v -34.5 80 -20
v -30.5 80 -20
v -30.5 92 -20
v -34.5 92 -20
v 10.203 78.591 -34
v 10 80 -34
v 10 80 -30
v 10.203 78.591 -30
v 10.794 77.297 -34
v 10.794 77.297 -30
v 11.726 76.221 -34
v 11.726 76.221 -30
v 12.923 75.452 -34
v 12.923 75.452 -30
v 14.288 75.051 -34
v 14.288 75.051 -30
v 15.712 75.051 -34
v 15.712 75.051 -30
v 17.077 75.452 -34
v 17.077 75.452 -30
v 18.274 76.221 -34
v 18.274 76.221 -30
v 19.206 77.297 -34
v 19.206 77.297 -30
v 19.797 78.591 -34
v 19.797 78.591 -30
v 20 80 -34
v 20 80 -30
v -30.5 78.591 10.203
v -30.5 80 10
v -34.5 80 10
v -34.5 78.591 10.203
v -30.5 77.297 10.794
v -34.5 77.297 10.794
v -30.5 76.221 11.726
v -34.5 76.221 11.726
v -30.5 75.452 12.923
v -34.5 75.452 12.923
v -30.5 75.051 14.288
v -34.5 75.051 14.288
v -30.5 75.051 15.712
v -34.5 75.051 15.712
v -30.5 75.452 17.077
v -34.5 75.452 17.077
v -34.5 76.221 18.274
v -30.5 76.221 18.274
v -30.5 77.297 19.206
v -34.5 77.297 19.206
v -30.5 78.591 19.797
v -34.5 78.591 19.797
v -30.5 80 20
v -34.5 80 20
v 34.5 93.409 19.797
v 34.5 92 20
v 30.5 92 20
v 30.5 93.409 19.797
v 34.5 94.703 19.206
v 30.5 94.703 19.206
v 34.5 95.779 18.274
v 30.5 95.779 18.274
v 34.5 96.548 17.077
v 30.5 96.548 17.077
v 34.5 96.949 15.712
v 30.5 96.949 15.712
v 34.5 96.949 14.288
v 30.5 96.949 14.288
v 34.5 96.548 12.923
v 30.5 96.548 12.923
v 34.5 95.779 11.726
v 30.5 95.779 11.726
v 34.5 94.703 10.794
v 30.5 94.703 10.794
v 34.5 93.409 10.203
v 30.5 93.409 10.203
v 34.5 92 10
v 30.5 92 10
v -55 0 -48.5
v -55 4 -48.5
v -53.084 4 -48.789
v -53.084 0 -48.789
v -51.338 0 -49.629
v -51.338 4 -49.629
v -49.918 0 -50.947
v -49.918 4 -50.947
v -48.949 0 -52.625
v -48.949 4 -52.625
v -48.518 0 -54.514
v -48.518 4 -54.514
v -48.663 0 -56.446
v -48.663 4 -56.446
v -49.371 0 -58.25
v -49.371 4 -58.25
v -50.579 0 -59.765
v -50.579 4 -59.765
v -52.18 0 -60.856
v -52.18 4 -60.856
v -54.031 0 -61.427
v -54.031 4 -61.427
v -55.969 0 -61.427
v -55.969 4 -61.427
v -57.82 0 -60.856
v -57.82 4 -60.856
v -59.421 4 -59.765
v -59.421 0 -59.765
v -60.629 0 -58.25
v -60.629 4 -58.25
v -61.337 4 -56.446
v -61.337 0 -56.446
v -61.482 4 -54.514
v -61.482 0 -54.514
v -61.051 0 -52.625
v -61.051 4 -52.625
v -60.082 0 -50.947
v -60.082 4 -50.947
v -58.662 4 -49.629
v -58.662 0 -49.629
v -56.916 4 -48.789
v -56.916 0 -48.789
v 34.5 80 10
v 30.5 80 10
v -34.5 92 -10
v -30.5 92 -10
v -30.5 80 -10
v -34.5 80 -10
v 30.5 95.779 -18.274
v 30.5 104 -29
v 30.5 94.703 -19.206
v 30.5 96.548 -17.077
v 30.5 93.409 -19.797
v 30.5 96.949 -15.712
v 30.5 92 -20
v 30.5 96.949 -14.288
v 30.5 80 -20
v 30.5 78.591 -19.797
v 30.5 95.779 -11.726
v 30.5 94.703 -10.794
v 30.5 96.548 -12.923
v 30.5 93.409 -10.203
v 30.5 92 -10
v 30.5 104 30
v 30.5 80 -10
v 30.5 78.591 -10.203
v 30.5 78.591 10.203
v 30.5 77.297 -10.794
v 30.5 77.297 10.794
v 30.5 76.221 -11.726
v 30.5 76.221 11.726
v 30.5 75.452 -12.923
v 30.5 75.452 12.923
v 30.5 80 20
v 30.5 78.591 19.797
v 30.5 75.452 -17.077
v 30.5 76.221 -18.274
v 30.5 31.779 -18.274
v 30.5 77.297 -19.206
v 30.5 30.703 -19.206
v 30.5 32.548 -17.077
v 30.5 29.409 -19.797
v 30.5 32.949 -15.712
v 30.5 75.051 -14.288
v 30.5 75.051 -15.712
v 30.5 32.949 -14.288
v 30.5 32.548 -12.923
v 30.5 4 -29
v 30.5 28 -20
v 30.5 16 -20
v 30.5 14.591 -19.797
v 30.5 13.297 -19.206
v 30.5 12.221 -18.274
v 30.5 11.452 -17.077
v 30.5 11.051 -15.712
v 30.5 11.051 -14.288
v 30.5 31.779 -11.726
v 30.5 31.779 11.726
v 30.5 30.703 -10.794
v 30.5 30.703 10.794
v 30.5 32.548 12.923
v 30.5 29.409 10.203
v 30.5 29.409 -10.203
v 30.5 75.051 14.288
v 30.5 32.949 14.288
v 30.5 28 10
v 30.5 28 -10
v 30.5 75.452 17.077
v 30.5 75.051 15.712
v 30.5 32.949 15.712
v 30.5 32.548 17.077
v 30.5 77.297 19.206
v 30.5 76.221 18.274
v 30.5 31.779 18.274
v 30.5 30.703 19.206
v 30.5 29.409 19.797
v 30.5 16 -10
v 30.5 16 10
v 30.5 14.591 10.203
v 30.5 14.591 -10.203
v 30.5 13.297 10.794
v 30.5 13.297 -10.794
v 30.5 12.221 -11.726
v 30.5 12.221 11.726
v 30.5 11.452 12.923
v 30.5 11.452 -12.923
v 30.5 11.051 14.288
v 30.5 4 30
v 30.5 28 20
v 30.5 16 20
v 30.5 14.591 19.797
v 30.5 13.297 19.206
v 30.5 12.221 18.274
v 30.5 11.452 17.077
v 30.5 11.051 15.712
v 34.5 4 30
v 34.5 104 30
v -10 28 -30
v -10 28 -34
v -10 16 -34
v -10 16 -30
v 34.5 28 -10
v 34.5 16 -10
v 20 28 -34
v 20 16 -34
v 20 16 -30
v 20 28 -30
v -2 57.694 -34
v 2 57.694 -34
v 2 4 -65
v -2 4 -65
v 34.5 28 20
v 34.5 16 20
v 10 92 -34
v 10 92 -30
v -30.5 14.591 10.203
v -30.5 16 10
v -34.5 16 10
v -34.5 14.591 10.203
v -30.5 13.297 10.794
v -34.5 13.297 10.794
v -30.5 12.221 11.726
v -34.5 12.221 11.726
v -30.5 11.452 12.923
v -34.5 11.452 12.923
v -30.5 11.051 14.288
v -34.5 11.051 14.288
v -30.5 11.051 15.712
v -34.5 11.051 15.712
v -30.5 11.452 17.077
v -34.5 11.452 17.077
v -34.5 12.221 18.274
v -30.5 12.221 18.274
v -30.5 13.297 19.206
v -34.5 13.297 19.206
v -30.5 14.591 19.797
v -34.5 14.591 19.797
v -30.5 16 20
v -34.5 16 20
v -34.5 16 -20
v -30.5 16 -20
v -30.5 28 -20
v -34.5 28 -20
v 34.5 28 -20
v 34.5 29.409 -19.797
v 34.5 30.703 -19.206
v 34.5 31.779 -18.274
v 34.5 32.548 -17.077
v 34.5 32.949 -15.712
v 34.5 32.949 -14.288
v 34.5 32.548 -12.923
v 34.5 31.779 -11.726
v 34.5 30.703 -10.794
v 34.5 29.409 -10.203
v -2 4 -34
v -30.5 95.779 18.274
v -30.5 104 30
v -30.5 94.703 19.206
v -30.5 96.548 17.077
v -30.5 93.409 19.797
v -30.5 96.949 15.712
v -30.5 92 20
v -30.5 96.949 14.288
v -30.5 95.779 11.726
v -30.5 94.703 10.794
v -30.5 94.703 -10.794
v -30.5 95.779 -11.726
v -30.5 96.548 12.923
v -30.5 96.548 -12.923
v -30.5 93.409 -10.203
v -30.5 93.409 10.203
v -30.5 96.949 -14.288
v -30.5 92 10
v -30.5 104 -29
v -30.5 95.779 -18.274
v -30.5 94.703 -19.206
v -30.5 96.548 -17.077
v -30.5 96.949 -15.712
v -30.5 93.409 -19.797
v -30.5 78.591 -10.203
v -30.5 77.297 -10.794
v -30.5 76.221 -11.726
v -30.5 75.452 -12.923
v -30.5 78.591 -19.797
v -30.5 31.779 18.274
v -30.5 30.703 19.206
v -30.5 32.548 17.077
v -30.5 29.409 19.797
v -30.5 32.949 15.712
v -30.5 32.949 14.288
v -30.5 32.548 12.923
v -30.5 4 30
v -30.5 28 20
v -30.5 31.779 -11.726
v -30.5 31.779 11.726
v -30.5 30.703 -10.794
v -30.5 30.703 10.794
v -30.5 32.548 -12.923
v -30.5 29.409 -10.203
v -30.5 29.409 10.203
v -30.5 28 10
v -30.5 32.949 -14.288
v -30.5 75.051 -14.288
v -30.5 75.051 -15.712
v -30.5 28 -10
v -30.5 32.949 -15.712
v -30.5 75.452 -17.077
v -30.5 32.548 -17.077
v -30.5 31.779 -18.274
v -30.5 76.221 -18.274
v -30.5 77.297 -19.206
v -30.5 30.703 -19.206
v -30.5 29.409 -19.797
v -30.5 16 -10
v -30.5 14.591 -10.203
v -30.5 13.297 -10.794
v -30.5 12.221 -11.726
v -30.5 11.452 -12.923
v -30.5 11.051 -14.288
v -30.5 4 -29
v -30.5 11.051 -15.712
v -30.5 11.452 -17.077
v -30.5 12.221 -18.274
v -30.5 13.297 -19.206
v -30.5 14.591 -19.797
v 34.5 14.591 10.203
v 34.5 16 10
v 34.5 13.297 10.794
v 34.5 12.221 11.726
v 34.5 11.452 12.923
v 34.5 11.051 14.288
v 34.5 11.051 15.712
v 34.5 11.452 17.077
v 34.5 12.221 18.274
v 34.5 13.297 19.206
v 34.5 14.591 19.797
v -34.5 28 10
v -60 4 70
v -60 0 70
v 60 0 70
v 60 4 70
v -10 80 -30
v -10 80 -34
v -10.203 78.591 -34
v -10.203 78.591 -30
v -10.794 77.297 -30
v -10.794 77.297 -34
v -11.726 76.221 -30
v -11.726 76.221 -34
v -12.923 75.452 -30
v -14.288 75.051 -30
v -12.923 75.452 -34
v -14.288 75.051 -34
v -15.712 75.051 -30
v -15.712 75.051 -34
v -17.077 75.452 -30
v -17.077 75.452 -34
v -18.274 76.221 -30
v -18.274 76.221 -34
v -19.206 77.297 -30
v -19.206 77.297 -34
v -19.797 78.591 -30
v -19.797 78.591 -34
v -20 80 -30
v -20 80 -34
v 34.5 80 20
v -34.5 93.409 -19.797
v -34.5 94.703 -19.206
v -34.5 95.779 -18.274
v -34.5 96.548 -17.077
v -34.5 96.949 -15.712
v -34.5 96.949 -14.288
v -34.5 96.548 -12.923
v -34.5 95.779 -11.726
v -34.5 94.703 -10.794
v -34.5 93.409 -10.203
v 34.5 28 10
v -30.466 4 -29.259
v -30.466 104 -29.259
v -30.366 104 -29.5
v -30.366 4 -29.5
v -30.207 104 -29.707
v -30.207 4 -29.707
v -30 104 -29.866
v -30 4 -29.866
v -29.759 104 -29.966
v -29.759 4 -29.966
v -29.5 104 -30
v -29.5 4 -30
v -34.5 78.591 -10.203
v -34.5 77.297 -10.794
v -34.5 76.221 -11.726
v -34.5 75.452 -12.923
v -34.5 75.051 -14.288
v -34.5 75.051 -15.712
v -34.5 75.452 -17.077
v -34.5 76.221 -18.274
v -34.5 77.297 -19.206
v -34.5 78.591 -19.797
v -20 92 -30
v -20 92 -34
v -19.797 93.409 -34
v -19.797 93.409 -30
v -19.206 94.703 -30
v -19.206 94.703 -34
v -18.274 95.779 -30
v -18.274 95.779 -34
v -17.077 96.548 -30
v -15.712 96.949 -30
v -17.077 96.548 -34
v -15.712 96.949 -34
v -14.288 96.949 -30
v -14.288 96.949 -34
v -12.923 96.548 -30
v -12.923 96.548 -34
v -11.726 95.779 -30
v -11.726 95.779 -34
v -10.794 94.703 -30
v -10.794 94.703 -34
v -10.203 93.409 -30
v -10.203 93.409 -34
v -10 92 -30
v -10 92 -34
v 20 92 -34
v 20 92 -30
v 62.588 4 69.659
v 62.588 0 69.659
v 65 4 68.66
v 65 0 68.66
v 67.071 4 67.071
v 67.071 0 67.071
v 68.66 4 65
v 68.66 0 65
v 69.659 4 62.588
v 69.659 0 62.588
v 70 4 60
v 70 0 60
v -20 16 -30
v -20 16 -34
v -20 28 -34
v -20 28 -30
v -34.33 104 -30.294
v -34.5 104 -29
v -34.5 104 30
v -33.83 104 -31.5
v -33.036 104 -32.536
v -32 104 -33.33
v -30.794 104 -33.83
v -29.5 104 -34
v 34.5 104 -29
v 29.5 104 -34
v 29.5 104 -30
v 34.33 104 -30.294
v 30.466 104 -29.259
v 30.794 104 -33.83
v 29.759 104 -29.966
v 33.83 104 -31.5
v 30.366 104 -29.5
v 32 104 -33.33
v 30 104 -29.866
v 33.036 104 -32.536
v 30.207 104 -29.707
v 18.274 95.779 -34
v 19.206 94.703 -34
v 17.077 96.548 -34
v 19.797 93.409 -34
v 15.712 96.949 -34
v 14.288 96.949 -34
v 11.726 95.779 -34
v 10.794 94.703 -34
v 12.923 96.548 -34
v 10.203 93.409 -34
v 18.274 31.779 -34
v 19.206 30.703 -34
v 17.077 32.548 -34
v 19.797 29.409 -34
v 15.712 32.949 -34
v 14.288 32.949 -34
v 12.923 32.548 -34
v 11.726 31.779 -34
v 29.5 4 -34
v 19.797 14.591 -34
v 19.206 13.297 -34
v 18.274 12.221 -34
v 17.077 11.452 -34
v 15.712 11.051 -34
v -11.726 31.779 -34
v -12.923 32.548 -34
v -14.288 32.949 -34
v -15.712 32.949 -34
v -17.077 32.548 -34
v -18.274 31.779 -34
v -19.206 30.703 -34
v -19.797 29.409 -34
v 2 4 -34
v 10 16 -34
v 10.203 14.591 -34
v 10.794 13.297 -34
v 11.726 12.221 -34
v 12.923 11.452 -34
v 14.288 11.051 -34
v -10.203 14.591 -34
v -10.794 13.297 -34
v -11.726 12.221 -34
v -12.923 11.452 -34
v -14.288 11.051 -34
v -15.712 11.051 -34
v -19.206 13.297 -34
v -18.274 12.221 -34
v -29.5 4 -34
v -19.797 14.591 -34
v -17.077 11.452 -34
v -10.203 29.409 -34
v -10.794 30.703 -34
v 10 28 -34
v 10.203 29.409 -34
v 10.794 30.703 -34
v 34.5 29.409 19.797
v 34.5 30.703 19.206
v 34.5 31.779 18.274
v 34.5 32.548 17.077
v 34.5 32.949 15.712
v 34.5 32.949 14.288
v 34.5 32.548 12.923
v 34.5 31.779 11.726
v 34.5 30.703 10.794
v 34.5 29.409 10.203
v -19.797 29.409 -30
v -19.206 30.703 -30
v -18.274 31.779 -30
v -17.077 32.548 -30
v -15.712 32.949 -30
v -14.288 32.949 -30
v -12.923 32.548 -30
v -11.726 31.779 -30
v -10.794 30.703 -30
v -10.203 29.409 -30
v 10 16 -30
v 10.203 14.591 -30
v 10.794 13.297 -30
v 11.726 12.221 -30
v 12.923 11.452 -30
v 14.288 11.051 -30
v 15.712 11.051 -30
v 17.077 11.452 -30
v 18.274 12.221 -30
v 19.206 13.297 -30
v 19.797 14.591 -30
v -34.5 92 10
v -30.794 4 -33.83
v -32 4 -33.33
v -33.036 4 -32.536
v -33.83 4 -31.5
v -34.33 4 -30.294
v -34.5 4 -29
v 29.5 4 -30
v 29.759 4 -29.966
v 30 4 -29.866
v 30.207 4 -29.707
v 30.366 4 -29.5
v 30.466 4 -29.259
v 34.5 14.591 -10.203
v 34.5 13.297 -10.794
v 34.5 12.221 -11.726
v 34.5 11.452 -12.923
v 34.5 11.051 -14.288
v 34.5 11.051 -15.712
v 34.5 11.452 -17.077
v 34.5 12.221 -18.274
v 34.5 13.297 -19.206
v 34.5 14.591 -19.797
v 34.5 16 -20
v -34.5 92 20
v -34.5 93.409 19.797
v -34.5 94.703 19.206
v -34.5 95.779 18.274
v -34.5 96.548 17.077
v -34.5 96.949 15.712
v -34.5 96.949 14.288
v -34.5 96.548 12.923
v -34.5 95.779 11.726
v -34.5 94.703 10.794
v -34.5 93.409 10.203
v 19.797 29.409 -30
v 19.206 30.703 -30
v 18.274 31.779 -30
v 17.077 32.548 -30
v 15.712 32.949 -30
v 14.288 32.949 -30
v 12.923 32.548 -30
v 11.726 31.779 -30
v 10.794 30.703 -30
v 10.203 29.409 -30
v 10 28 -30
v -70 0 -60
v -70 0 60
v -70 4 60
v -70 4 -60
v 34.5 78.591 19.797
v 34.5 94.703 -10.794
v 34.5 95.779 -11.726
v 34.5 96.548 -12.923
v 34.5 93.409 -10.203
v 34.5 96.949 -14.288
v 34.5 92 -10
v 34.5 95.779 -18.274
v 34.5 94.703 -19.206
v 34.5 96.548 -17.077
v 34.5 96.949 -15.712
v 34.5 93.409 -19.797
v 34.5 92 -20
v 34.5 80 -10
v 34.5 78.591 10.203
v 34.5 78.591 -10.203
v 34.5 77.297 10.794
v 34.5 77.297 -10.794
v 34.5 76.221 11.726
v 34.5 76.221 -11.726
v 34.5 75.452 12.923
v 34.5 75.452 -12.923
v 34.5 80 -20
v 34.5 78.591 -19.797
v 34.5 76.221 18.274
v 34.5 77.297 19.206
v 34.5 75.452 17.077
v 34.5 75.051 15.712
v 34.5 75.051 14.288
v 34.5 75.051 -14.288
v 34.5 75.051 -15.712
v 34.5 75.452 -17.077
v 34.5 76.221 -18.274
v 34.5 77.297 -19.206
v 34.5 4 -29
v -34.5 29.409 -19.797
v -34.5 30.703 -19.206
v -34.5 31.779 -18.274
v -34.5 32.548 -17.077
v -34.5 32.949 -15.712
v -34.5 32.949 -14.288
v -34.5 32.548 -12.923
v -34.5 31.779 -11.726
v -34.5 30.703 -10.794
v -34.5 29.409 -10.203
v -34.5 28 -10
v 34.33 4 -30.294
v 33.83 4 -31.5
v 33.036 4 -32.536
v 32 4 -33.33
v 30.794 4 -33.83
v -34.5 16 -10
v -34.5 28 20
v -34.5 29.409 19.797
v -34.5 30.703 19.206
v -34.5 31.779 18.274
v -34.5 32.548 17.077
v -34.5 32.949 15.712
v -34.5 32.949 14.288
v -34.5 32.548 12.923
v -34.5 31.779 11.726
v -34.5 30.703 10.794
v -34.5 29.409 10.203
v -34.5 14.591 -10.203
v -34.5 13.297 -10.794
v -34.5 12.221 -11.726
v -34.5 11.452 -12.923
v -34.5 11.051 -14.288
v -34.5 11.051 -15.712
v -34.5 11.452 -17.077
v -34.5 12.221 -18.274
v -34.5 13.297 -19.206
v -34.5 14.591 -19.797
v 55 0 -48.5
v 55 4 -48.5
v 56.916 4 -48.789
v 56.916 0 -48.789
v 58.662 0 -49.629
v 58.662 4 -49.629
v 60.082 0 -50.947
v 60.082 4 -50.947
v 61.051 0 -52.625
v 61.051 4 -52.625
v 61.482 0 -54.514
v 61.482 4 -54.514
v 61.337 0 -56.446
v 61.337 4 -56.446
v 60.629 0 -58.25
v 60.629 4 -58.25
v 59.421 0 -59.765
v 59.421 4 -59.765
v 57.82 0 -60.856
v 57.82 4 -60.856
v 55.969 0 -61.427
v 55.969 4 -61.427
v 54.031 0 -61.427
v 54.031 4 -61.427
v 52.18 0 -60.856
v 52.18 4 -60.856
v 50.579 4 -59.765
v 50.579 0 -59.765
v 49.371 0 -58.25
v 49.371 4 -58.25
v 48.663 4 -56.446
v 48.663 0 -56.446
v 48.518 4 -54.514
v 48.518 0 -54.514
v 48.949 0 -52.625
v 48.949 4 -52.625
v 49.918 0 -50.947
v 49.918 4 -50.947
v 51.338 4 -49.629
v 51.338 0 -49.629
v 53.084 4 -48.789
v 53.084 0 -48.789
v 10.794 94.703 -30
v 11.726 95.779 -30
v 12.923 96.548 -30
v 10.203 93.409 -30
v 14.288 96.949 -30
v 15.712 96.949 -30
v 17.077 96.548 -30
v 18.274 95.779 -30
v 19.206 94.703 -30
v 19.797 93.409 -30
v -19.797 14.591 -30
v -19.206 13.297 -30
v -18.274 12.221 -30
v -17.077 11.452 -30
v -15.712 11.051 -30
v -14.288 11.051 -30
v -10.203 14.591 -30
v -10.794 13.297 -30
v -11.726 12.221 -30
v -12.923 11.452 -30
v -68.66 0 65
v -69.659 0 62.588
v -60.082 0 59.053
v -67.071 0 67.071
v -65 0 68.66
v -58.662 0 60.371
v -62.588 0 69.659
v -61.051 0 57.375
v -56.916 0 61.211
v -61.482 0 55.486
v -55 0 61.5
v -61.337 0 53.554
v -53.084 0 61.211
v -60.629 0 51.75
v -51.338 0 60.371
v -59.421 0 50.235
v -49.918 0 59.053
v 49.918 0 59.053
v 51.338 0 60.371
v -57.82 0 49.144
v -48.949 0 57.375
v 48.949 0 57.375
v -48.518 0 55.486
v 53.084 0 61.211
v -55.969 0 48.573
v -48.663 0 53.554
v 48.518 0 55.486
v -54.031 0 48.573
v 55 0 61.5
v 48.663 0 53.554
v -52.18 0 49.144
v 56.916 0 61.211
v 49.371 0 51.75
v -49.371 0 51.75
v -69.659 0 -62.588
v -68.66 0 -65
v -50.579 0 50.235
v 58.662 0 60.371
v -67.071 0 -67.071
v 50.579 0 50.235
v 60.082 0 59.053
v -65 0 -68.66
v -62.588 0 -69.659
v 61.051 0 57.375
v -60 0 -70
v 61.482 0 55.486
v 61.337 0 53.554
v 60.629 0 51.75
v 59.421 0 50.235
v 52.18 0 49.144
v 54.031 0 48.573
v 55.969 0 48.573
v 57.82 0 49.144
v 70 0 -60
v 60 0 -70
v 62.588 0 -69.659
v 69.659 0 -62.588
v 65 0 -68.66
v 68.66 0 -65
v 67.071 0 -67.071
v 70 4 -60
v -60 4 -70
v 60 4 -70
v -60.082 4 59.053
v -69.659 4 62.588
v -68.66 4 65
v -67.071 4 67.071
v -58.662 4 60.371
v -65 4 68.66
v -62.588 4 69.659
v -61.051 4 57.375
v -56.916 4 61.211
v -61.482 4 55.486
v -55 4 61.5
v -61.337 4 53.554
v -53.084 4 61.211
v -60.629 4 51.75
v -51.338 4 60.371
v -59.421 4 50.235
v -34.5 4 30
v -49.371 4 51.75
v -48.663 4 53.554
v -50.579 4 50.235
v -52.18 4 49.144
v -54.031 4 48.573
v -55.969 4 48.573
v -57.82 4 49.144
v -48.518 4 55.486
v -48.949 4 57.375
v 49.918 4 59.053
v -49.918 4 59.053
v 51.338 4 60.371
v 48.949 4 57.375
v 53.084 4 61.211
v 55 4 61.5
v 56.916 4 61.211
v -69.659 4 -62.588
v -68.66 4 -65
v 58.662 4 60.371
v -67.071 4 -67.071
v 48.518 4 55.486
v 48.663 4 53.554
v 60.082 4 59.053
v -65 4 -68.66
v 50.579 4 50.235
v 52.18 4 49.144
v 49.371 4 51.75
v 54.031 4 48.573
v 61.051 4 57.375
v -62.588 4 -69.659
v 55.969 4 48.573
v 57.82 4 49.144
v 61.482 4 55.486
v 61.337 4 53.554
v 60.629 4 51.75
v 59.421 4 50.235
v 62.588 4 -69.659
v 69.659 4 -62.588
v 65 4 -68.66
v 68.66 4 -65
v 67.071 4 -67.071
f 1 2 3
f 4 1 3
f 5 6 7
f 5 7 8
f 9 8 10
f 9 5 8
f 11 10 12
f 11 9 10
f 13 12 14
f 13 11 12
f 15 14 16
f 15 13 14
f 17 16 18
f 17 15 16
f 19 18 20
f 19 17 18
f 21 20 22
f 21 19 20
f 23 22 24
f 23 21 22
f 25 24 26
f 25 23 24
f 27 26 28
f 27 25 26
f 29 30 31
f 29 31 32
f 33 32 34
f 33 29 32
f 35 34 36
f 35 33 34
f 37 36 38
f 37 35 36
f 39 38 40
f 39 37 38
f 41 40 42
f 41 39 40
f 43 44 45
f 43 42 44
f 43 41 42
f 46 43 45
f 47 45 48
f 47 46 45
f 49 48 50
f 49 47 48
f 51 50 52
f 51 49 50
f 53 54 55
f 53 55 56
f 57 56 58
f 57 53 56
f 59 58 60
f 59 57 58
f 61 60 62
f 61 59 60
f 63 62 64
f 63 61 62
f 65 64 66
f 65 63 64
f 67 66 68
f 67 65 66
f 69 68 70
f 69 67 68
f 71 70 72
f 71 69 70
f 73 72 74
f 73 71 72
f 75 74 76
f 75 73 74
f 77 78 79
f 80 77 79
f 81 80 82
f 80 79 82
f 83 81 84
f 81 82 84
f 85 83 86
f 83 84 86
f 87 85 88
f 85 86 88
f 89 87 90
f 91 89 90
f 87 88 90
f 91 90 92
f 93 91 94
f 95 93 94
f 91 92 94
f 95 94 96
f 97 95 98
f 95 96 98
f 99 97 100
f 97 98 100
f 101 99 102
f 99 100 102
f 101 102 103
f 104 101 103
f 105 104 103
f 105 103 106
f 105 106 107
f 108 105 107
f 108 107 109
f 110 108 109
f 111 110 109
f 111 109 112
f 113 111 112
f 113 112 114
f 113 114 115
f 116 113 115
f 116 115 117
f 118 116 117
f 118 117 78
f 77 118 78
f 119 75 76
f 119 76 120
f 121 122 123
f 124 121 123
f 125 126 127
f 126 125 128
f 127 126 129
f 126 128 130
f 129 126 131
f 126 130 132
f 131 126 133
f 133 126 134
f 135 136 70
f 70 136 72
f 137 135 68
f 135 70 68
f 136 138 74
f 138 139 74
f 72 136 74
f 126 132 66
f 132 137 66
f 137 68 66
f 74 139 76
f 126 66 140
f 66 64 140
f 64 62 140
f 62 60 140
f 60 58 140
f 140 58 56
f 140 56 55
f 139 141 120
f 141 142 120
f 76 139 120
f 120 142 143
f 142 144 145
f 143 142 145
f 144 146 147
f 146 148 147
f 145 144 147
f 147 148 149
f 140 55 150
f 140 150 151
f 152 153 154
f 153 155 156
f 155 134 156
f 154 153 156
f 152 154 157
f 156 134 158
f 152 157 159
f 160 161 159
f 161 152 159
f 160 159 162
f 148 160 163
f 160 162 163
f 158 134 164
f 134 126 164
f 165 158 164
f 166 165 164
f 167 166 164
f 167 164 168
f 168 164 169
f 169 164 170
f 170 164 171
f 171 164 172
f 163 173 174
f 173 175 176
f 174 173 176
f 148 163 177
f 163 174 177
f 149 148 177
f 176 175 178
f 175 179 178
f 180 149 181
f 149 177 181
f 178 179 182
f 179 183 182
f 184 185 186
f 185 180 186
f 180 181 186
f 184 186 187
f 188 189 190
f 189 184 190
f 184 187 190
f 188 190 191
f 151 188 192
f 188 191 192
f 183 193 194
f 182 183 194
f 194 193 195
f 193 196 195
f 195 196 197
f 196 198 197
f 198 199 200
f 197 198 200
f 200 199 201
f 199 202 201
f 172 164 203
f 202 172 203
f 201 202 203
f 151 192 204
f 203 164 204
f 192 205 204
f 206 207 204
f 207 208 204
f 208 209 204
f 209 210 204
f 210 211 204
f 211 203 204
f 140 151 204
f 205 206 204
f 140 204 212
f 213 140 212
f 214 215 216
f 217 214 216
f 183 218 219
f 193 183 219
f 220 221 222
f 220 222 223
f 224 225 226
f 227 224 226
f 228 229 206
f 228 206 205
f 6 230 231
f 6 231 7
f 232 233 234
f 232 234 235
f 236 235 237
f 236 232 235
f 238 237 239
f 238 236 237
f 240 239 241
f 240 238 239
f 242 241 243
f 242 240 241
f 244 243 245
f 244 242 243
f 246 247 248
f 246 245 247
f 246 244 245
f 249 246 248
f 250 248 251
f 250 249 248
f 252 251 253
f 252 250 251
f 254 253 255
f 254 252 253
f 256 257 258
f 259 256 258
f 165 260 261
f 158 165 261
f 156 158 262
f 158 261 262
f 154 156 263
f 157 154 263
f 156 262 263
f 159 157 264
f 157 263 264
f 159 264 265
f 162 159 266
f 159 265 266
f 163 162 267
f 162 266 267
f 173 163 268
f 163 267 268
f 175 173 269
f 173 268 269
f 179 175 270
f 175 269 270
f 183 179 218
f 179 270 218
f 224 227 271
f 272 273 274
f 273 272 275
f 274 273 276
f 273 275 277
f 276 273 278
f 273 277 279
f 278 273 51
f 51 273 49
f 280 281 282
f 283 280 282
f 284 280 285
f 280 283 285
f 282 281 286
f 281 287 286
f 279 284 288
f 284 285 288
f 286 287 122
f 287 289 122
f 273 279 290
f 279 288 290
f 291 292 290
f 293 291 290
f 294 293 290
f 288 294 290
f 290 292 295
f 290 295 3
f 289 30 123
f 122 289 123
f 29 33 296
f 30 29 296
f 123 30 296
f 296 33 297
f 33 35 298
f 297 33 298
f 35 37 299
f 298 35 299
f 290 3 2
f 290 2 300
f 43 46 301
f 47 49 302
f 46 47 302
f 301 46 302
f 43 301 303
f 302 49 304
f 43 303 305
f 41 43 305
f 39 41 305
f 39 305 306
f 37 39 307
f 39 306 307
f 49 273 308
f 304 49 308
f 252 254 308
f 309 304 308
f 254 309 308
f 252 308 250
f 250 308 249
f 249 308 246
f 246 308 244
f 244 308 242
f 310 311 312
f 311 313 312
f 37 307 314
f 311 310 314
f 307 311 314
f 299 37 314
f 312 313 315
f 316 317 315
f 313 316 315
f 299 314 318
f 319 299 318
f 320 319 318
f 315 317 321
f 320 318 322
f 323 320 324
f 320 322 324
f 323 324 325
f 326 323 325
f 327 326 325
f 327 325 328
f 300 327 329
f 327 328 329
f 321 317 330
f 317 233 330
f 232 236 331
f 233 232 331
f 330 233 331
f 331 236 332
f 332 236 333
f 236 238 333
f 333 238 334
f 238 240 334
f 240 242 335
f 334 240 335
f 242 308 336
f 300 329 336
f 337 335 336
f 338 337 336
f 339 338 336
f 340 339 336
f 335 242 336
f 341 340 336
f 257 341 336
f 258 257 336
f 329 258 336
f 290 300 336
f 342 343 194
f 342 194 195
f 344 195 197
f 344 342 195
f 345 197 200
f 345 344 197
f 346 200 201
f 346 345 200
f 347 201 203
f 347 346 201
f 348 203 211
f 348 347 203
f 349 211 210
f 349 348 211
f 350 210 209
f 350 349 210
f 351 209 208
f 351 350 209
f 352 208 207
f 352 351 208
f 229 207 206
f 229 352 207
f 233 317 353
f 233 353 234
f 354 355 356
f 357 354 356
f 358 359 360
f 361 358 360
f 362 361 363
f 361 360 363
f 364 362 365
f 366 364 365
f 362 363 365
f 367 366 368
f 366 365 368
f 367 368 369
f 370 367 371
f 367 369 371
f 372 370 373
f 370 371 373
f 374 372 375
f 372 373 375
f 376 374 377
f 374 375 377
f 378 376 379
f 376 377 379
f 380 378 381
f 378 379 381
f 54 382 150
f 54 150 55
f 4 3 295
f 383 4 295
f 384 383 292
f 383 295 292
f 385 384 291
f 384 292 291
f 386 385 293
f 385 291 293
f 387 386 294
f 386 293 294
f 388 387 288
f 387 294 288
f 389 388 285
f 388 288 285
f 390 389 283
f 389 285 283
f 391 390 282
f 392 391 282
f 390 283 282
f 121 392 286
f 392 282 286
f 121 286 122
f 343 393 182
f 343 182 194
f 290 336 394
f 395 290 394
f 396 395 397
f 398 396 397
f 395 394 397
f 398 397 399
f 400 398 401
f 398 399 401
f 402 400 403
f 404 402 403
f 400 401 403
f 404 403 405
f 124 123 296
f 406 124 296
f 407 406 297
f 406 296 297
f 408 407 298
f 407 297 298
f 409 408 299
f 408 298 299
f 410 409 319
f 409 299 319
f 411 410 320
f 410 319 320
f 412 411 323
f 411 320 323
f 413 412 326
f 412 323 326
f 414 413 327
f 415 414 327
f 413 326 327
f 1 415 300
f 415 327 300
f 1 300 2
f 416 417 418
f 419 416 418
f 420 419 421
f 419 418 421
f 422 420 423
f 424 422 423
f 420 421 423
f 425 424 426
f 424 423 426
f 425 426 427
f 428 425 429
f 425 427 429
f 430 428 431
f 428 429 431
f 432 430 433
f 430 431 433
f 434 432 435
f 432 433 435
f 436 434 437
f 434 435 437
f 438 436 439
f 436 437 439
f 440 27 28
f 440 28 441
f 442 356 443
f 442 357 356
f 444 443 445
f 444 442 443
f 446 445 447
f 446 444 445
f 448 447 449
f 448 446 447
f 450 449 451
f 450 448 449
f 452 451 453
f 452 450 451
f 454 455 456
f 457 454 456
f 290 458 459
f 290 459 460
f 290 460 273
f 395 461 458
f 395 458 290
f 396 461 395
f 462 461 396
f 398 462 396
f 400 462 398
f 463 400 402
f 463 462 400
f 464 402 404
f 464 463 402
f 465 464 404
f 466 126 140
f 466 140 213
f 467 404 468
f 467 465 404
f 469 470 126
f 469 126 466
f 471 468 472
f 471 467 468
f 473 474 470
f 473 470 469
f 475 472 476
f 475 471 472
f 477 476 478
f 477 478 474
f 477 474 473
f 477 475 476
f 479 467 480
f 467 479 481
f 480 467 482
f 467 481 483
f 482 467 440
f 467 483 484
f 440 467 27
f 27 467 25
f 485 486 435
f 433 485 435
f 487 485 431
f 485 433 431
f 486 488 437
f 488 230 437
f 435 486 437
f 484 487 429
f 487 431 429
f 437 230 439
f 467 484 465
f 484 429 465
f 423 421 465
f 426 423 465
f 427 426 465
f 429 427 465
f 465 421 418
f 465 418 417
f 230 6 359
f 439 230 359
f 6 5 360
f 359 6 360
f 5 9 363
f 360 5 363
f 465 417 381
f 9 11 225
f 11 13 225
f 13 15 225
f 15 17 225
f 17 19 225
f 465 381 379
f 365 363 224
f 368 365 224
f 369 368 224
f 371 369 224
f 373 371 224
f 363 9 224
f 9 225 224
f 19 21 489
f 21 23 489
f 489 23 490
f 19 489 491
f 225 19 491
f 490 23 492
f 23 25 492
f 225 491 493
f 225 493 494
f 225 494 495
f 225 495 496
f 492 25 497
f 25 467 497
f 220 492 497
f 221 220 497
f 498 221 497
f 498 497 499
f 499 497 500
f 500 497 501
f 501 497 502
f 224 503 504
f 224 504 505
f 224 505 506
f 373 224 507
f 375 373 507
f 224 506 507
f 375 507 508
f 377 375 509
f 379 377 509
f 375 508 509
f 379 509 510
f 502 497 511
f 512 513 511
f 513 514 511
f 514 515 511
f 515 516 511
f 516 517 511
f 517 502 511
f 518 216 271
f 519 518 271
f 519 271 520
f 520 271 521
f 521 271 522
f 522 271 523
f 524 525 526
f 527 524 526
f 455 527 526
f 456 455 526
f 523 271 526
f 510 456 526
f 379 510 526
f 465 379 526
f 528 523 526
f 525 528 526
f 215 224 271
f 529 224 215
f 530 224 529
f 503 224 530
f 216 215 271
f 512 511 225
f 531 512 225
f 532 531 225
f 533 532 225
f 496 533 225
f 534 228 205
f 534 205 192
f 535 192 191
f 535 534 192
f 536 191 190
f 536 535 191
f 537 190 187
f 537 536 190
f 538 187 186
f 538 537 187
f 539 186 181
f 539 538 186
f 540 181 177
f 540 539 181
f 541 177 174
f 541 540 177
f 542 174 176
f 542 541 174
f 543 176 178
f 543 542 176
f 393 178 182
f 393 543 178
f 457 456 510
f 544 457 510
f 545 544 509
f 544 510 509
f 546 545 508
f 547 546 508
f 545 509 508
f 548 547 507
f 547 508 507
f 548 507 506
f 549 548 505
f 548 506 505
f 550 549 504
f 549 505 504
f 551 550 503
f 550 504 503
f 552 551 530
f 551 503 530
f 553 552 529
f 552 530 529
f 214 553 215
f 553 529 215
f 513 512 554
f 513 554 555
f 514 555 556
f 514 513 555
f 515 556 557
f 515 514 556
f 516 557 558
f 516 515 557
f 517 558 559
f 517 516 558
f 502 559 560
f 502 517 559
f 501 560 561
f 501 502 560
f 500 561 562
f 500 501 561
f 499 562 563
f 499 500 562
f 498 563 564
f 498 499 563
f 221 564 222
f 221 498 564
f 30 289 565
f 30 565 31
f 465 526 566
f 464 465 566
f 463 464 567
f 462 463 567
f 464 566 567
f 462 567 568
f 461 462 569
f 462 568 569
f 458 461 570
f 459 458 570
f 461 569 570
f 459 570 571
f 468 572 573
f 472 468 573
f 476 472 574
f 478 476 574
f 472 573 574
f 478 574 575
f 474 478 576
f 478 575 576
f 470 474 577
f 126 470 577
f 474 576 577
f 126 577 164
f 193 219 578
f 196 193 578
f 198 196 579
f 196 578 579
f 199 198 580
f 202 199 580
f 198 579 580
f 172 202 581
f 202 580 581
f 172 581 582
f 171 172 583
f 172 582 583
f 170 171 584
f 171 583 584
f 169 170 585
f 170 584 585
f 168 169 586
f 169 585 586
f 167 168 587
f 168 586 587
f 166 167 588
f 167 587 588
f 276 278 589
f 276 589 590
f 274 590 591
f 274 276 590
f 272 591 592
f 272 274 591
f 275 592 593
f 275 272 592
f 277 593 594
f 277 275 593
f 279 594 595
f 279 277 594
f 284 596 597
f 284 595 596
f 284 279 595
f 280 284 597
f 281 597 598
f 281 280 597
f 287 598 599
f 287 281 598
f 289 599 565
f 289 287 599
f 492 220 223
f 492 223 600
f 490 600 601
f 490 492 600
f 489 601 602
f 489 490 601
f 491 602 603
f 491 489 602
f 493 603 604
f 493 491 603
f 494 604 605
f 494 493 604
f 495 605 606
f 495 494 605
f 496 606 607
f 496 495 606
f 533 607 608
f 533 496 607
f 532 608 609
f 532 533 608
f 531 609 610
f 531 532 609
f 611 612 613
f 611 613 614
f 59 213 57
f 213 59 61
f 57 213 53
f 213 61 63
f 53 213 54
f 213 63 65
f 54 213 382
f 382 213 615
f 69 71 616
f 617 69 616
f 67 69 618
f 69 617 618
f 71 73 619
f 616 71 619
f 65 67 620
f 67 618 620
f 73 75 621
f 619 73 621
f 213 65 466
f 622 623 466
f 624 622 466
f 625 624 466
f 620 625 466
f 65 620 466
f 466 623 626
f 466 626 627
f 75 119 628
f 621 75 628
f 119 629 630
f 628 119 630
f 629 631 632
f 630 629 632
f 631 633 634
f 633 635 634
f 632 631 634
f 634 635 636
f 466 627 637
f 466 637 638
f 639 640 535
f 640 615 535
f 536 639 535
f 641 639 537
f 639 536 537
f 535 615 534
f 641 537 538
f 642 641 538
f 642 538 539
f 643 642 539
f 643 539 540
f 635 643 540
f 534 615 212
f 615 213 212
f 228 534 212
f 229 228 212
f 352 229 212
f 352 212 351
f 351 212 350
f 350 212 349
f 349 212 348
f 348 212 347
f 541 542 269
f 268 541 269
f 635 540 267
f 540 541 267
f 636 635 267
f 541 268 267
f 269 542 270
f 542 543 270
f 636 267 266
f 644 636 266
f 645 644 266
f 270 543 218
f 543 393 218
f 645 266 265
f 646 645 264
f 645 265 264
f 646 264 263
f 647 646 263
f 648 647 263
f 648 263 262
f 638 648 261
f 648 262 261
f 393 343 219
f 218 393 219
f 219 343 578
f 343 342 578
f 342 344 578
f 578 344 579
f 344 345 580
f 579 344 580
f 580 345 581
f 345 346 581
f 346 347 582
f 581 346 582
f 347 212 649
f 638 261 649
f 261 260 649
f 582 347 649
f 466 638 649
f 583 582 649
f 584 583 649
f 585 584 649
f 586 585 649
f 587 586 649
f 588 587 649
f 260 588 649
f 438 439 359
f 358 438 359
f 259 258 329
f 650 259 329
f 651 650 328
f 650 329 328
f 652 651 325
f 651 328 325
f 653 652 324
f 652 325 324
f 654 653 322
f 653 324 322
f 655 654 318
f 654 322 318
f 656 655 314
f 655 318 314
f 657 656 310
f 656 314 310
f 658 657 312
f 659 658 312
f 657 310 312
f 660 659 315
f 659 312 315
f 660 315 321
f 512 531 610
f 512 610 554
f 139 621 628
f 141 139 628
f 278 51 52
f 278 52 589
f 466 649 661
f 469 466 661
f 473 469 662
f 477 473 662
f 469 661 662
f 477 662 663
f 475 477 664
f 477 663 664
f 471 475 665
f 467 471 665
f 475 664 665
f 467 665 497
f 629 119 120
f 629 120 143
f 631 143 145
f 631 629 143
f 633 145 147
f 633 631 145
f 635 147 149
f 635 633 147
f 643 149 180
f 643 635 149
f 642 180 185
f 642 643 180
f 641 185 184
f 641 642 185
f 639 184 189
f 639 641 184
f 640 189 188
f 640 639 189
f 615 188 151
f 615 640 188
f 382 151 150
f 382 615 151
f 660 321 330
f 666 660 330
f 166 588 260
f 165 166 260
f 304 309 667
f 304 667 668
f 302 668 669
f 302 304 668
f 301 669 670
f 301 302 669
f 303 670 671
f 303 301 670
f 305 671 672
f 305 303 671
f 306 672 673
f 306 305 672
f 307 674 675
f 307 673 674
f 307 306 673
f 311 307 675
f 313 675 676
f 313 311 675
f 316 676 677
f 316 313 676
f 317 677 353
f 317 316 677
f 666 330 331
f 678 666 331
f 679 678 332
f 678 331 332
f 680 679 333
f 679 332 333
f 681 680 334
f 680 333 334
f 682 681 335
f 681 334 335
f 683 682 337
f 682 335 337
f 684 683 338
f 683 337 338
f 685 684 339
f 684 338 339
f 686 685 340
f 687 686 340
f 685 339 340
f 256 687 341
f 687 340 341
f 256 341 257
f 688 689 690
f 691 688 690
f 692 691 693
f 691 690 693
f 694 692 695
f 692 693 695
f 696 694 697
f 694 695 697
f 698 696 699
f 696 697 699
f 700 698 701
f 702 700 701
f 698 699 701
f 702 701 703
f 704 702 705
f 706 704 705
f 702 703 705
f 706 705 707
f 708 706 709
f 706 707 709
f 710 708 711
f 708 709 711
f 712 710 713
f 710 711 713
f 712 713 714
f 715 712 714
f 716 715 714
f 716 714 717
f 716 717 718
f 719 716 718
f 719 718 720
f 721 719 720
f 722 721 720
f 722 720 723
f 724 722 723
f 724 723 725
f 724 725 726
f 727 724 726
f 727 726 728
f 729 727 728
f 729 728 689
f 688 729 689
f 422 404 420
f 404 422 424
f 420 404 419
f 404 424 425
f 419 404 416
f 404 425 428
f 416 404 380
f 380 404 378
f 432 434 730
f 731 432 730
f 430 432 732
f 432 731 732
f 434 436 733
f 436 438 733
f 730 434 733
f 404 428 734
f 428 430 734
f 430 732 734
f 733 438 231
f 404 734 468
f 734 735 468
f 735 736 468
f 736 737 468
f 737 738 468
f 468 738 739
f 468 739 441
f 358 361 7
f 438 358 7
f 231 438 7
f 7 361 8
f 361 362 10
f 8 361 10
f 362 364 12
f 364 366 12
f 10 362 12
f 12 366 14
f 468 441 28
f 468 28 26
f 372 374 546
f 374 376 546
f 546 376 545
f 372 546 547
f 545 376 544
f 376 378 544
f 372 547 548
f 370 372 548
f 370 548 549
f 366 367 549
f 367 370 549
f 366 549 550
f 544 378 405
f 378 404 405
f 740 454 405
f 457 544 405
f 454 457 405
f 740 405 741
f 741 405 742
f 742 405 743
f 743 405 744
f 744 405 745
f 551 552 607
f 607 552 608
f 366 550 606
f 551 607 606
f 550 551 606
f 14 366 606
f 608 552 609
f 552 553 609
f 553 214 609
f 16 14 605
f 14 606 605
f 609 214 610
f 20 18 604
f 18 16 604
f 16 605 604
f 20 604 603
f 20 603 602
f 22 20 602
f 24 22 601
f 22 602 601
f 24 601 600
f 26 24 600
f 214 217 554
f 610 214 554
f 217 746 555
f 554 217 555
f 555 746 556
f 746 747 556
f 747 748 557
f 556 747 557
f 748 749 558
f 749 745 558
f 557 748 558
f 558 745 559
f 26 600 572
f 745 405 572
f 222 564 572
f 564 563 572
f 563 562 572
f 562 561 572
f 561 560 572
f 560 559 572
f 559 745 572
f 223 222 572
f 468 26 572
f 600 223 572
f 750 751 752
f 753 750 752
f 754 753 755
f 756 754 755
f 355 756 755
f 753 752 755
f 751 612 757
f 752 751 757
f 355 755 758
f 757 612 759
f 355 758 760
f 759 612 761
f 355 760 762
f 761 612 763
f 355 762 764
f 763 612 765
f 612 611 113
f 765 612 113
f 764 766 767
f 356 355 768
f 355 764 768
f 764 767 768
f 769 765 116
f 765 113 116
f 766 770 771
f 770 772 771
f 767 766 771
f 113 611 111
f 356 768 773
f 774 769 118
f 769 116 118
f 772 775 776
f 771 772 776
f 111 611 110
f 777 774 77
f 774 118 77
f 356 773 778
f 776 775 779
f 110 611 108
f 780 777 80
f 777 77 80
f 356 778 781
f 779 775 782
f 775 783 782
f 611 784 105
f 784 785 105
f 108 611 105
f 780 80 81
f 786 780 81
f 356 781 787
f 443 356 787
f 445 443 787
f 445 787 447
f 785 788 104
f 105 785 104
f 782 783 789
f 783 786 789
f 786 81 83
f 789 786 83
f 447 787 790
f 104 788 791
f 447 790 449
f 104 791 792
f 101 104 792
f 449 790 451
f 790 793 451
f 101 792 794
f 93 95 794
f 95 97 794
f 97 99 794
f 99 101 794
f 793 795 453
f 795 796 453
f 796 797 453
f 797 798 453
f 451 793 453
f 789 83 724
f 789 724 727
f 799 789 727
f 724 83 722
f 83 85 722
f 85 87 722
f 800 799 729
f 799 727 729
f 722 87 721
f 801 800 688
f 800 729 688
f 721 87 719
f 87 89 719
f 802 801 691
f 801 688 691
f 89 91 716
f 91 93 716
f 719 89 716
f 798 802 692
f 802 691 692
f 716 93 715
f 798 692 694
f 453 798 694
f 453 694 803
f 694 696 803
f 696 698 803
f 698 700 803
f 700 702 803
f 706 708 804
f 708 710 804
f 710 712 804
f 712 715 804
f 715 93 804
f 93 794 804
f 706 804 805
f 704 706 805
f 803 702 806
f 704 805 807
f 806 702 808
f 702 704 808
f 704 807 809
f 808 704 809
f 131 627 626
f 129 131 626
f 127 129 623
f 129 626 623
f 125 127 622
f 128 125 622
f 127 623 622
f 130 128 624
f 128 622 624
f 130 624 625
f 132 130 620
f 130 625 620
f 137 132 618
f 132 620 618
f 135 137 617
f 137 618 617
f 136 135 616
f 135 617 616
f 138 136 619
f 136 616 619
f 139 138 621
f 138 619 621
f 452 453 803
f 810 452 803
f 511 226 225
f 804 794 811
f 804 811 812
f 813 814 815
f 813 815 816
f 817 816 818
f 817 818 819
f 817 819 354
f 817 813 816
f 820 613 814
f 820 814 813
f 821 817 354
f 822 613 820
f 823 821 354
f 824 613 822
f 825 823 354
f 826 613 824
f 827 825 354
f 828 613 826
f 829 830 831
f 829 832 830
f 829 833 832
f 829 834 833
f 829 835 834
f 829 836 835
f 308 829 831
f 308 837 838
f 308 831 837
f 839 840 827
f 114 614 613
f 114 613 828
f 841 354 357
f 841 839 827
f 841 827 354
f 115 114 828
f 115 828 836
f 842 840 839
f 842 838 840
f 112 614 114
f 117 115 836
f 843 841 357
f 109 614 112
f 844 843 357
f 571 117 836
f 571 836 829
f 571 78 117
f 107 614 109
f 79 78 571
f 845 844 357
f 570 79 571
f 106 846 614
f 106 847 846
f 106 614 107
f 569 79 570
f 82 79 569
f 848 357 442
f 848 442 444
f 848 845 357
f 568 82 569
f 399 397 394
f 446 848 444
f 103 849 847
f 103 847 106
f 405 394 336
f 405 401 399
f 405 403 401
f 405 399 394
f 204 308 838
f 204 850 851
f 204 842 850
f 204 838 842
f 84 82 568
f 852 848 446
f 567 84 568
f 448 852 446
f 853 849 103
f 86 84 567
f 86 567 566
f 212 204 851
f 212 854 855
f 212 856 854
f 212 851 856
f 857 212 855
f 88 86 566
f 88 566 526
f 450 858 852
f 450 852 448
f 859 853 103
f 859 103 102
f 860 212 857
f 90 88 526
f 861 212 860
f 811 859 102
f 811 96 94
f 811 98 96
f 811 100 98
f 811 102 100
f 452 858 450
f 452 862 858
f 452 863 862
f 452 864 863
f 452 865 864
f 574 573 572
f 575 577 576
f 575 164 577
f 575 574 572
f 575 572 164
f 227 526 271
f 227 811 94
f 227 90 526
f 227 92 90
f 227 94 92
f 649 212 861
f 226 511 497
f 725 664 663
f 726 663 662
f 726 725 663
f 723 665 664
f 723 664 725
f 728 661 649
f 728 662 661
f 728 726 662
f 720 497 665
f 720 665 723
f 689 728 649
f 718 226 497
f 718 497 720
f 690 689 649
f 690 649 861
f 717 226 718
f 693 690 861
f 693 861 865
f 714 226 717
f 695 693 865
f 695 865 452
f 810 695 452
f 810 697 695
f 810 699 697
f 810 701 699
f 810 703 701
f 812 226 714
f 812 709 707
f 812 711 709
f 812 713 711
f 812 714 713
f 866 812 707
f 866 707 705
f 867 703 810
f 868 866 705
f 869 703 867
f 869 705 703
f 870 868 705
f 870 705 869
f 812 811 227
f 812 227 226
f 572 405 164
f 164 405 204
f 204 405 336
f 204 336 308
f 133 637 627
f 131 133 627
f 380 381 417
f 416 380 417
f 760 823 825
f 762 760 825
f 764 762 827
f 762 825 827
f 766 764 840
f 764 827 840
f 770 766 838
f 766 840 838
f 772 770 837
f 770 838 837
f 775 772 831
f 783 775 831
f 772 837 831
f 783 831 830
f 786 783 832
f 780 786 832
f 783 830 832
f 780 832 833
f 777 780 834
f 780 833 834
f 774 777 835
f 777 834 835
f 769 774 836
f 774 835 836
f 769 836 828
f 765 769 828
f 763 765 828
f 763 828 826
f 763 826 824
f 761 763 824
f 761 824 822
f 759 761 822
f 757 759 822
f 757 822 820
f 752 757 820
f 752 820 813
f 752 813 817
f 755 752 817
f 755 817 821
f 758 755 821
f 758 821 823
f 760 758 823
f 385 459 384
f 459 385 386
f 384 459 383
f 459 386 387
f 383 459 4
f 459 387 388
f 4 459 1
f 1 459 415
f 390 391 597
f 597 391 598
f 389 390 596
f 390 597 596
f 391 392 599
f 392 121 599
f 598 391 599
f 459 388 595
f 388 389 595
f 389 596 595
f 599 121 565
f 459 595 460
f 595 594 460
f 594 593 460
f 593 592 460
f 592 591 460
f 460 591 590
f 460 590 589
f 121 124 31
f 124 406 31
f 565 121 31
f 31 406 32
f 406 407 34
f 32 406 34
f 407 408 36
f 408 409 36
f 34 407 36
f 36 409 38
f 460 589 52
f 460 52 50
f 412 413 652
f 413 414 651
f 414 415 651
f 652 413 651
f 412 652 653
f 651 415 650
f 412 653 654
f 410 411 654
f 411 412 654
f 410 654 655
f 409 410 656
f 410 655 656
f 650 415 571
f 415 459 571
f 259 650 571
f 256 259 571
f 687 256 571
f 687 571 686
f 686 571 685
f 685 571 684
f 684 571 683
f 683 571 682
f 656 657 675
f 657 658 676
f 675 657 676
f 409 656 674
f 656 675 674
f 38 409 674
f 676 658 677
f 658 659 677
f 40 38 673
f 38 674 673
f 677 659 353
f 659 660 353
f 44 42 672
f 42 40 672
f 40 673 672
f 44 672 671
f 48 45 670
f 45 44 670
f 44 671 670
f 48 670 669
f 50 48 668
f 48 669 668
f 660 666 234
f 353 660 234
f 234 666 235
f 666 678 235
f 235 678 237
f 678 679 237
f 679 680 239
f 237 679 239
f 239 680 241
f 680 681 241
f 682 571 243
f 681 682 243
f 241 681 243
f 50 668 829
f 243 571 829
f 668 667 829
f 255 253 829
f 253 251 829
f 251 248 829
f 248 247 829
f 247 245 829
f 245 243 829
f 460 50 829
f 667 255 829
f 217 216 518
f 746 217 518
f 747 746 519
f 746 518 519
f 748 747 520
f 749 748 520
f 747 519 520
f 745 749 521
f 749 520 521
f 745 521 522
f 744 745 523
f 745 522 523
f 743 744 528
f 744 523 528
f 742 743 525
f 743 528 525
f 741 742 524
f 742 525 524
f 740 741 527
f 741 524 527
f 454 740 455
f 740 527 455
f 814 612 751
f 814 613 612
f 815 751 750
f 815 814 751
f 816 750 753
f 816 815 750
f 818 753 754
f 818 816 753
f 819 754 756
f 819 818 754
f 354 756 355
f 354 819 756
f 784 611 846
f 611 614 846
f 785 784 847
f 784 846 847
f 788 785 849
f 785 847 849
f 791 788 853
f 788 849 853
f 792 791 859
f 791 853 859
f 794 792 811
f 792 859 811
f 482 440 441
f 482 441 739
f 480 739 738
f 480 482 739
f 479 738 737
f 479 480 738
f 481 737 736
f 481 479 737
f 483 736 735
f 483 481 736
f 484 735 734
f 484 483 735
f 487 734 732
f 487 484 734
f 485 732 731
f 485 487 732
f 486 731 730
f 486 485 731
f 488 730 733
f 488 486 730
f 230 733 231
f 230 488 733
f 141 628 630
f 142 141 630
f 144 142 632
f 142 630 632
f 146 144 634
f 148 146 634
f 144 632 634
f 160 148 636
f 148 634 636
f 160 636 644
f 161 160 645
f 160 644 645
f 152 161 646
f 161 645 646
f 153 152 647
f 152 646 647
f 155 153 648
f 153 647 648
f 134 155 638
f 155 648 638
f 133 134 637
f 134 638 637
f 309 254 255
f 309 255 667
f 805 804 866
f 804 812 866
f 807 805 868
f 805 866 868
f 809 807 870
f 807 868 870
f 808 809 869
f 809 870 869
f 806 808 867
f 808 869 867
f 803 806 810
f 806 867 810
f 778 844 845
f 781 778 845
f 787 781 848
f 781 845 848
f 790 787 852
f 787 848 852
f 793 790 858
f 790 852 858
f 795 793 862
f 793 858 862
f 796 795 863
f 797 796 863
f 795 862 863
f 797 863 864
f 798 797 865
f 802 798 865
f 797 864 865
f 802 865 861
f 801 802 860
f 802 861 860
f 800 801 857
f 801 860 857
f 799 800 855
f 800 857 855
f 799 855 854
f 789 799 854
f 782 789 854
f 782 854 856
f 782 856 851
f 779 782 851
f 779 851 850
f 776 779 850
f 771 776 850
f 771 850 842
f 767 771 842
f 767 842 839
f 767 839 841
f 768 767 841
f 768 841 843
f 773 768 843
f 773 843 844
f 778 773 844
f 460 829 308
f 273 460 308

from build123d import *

# Parameters (mm, degrees)
SKETCH_2_W          = 140
SKETCH_2_H          = 140
EXTRUDE_1_DEPTH     = 4
EXTRUDE_1_2_DEPTH   = 100
EXTRUDE_2_DEPTH     = 2
CUT_EXTRUDE_1_DEPTH = 105.5
SKETCH_6_R          = 6.5
CUT_EXTRUDE_2_DEPTH = 5
FILLET_1_R          = 10
CUT_EXTRUDE_3_REACH = 106


with BuildPart() as part:
    # Эскиз2 → Extrude 1 (new body)
    with BuildSketch(Plane(origin=(0, 0, 0), x_dir=(1, 0, 0), z_dir=(0, 1, 0))):
        Rectangle(SKETCH_2_W, SKETCH_2_H)
    extrude(amount=EXTRUDE_1_DEPTH)

    # Эскиз3 → Extrude 1 2 (add)
    with BuildSketch(Plane(origin=(0, 4, 0), x_dir=(1, 0, 0), z_dir=(0, 1, 0))):
        with BuildLine():
            Line((-30.5, -30), (-30.5, 29))
            ThreePointArc((-30.5, 29), (-30.207106781, 29.707106781), (-29.5, 30))
            Line((-29.5, 30), (29.5, 30))
            ThreePointArc((29.5, 30), (30.207106781, 29.707106781), (30.5, 29))
            Line((30.5, 29), (30.5, -30))
            Line((30.5, -30), (34.5, -30))
            Line((34.5, -30), (34.5, 29))
            ThreePointArc((34.5, 29), (33.035533906, 32.535533906), (29.5, 34))
            Line((29.5, 34), (-29.5, 34))
            ThreePointArc((-29.5, 34), (-33.035533906, 32.535533906), (-34.5, 29))
            Line((-34.5, 29), (-34.5, -30))
            Line((-34.5, -30), (-30.5, -30))
        make_face()
    extrude(amount=EXTRUDE_1_2_DEPTH)

    # Эскиз4 → Бобышка-Вытянуть2 (add, symmetric)
    with BuildSketch(Plane(origin=(0, 0, 0), x_dir=(0, 0, -1), z_dir=(1, 0, 0))):
        Polygon((34, 57.693575035), (65, 4), (34, 4), align=None)
    extrude(amount=EXTRUDE_2_DEPTH, both=True)

    # Эскиз5 → Вырез-Вытянуть1 (cut, through all)
    with BuildSketch(Plane(origin=(34.5, 0, 0), x_dir=(0, 0, -1), z_dir=(1, 0, 0))):
        with BuildLine():
            Line((-10, 92), (-10, 80))
            ThreePointArc((-10, 80), (-15, 75), (-20, 80))
            Line((-20, 80), (-20, 92))
            ThreePointArc((-20, 92), (-15, 97), (-10, 92))
        make_face()
        with BuildLine():
            Line((-10, 28), (-10, 16))
            ThreePointArc((-10, 16), (-15, 11), (-20, 16))
            Line((-20, 16), (-20, 28))
            ThreePointArc((-20, 28), (-15, 33), (-10, 28))
        make_face()
        with BuildLine():
            Line((10, 92), (10, 80))
            ThreePointArc((10, 80), (15, 75), (20, 80))
            Line((20, 80), (20, 92))
            ThreePointArc((20, 92), (15, 97), (10, 92))
        make_face()
        with BuildLine():
            Line((10, 28), (10, 16))
            ThreePointArc((10, 16), (15, 11), (20, 16))
            Line((20, 16), (20, 28))
            ThreePointArc((20, 28), (15, 33), (10, 28))
        make_face()
    extrude(amount=-CUT_EXTRUDE_1_DEPTH, mode=Mode.SUBTRACT)

    # Эскиз6 → Вырез-Вытянуть2 (cut, through all)
    with BuildSketch(Plane(origin=(0, 4, 0), x_dir=(1, 0, 0), z_dir=(0, 1, 0))):
        with Locations(Location((-55, 55, 0), (0, 0, 270))):  # turned: the seam where the file's is
            Circle(SKETCH_6_R)
        with Locations(Location((-55, -55, 0), (0, 0, 270))):  # turned: the seam where the file's is
            Circle(SKETCH_6_R)
        with Locations(Location((55, 55, 0), (0, 0, 270))):  # turned: the seam where the file's is
            Circle(SKETCH_6_R)
        with Locations(Location((55, -55, 0), (0, 0, 270))):  # turned: the seam where the file's is
            Circle(SKETCH_6_R)
    extrude(amount=-CUT_EXTRUDE_2_DEPTH, mode=Mode.SUBTRACT)

    # Скругление1
    fillet_1_edges = [part.edges().sort_by_distance(p)[0] for p in [
        (70, 2, 70),
        (-70, 2, 70),
        (-70, 2, -70),
        (70, 2, -70),
    ]]
    fillet(fillet_1_edges, radius=FILLET_1_R)

    # Эскиз8 → Вырез-Вытянуть3 (cut, up to next)
    with BuildSketch(Plane(origin=(0, 0, -34), x_dir=(-1, 0, 0), z_dir=(0, 0, -1)), mode=Mode.PRIVATE) as cut_extrude_3_sk1:
        with BuildLine():
            Line((-10, 92), (-10, 80))
            ThreePointArc((-10, 80), (-15, 75), (-20, 80))
            Line((-20, 80), (-20, 92))
            ThreePointArc((-20, 92), (-15, 97), (-10, 92))
        make_face()
    cut_extrude_3_tool1 = extrude(cut_extrude_3_sk1.sketch, amount=-CUT_EXTRUDE_3_REACH, mode=Mode.PRIVATE) & part.part
    add(cut_extrude_3_tool1.solids().sort_by_distance((15, 86, -34))[0], mode=Mode.SUBTRACT)
    # Эскиз8 → Вырез-Вытянуть3 (cut, up to next)
    with BuildSketch(Plane(origin=(0, 0, -34), x_dir=(-1, 0, 0), z_dir=(0, 0, -1)), mode=Mode.PRIVATE) as cut_extrude_3_sk2:
        with BuildLine():
            Line((-10, 28), (-10, 16))
            ThreePointArc((-10, 16), (-15, 11), (-20, 16))
            Line((-20, 16), (-20, 28))
            ThreePointArc((-20, 28), (-15, 33), (-10, 28))
        make_face()
    cut_extrude_3_tool2 = extrude(cut_extrude_3_sk2.sketch, amount=-CUT_EXTRUDE_3_REACH, mode=Mode.PRIVATE) & part.part
    add(cut_extrude_3_tool2.solids().sort_by_distance((15, 22, -34))[0], mode=Mode.SUBTRACT)
    # Эскиз8 → Вырез-Вытянуть3 (cut, up to next)
    with BuildSketch(Plane(origin=(0, 0, -34), x_dir=(-1, 0, 0), z_dir=(0, 0, -1)), mode=Mode.PRIVATE) as cut_extrude_3_sk3:
        with BuildLine():
            Line((10, 92), (10, 80))
            ThreePointArc((10, 80), (15, 75), (20, 80))
            Line((20, 80), (20, 92))
            ThreePointArc((20, 92), (15, 97), (10, 92))
        make_face()
    cut_extrude_3_tool3 = extrude(cut_extrude_3_sk3.sketch, amount=-CUT_EXTRUDE_3_REACH, mode=Mode.PRIVATE) & part.part
    add(cut_extrude_3_tool3.solids().sort_by_distance((-15, 86, -34))[0], mode=Mode.SUBTRACT)
    # Эскиз8 → Вырез-Вытянуть3 (cut, up to next)
    with BuildSketch(Plane(origin=(0, 0, -34), x_dir=(-1, 0, 0), z_dir=(0, 0, -1)), mode=Mode.PRIVATE) as cut_extrude_3_sk4:
        with BuildLine():
            Line((10, 28), (10, 16))
            ThreePointArc((10, 16), (15, 11), (20, 16))
            Line((20, 16), (20, 28))
            ThreePointArc((20, 28), (15, 33), (10, 28))
        make_face()
    cut_extrude_3_tool4 = extrude(cut_extrude_3_sk4.sketch, amount=-CUT_EXTRUDE_3_REACH, mode=Mode.PRIVATE) & part.part
    add(cut_extrude_3_tool4.solids().sort_by_distance((-15, 22, -34))[0], mode=Mode.SUBTRACT)


solid = part.part
